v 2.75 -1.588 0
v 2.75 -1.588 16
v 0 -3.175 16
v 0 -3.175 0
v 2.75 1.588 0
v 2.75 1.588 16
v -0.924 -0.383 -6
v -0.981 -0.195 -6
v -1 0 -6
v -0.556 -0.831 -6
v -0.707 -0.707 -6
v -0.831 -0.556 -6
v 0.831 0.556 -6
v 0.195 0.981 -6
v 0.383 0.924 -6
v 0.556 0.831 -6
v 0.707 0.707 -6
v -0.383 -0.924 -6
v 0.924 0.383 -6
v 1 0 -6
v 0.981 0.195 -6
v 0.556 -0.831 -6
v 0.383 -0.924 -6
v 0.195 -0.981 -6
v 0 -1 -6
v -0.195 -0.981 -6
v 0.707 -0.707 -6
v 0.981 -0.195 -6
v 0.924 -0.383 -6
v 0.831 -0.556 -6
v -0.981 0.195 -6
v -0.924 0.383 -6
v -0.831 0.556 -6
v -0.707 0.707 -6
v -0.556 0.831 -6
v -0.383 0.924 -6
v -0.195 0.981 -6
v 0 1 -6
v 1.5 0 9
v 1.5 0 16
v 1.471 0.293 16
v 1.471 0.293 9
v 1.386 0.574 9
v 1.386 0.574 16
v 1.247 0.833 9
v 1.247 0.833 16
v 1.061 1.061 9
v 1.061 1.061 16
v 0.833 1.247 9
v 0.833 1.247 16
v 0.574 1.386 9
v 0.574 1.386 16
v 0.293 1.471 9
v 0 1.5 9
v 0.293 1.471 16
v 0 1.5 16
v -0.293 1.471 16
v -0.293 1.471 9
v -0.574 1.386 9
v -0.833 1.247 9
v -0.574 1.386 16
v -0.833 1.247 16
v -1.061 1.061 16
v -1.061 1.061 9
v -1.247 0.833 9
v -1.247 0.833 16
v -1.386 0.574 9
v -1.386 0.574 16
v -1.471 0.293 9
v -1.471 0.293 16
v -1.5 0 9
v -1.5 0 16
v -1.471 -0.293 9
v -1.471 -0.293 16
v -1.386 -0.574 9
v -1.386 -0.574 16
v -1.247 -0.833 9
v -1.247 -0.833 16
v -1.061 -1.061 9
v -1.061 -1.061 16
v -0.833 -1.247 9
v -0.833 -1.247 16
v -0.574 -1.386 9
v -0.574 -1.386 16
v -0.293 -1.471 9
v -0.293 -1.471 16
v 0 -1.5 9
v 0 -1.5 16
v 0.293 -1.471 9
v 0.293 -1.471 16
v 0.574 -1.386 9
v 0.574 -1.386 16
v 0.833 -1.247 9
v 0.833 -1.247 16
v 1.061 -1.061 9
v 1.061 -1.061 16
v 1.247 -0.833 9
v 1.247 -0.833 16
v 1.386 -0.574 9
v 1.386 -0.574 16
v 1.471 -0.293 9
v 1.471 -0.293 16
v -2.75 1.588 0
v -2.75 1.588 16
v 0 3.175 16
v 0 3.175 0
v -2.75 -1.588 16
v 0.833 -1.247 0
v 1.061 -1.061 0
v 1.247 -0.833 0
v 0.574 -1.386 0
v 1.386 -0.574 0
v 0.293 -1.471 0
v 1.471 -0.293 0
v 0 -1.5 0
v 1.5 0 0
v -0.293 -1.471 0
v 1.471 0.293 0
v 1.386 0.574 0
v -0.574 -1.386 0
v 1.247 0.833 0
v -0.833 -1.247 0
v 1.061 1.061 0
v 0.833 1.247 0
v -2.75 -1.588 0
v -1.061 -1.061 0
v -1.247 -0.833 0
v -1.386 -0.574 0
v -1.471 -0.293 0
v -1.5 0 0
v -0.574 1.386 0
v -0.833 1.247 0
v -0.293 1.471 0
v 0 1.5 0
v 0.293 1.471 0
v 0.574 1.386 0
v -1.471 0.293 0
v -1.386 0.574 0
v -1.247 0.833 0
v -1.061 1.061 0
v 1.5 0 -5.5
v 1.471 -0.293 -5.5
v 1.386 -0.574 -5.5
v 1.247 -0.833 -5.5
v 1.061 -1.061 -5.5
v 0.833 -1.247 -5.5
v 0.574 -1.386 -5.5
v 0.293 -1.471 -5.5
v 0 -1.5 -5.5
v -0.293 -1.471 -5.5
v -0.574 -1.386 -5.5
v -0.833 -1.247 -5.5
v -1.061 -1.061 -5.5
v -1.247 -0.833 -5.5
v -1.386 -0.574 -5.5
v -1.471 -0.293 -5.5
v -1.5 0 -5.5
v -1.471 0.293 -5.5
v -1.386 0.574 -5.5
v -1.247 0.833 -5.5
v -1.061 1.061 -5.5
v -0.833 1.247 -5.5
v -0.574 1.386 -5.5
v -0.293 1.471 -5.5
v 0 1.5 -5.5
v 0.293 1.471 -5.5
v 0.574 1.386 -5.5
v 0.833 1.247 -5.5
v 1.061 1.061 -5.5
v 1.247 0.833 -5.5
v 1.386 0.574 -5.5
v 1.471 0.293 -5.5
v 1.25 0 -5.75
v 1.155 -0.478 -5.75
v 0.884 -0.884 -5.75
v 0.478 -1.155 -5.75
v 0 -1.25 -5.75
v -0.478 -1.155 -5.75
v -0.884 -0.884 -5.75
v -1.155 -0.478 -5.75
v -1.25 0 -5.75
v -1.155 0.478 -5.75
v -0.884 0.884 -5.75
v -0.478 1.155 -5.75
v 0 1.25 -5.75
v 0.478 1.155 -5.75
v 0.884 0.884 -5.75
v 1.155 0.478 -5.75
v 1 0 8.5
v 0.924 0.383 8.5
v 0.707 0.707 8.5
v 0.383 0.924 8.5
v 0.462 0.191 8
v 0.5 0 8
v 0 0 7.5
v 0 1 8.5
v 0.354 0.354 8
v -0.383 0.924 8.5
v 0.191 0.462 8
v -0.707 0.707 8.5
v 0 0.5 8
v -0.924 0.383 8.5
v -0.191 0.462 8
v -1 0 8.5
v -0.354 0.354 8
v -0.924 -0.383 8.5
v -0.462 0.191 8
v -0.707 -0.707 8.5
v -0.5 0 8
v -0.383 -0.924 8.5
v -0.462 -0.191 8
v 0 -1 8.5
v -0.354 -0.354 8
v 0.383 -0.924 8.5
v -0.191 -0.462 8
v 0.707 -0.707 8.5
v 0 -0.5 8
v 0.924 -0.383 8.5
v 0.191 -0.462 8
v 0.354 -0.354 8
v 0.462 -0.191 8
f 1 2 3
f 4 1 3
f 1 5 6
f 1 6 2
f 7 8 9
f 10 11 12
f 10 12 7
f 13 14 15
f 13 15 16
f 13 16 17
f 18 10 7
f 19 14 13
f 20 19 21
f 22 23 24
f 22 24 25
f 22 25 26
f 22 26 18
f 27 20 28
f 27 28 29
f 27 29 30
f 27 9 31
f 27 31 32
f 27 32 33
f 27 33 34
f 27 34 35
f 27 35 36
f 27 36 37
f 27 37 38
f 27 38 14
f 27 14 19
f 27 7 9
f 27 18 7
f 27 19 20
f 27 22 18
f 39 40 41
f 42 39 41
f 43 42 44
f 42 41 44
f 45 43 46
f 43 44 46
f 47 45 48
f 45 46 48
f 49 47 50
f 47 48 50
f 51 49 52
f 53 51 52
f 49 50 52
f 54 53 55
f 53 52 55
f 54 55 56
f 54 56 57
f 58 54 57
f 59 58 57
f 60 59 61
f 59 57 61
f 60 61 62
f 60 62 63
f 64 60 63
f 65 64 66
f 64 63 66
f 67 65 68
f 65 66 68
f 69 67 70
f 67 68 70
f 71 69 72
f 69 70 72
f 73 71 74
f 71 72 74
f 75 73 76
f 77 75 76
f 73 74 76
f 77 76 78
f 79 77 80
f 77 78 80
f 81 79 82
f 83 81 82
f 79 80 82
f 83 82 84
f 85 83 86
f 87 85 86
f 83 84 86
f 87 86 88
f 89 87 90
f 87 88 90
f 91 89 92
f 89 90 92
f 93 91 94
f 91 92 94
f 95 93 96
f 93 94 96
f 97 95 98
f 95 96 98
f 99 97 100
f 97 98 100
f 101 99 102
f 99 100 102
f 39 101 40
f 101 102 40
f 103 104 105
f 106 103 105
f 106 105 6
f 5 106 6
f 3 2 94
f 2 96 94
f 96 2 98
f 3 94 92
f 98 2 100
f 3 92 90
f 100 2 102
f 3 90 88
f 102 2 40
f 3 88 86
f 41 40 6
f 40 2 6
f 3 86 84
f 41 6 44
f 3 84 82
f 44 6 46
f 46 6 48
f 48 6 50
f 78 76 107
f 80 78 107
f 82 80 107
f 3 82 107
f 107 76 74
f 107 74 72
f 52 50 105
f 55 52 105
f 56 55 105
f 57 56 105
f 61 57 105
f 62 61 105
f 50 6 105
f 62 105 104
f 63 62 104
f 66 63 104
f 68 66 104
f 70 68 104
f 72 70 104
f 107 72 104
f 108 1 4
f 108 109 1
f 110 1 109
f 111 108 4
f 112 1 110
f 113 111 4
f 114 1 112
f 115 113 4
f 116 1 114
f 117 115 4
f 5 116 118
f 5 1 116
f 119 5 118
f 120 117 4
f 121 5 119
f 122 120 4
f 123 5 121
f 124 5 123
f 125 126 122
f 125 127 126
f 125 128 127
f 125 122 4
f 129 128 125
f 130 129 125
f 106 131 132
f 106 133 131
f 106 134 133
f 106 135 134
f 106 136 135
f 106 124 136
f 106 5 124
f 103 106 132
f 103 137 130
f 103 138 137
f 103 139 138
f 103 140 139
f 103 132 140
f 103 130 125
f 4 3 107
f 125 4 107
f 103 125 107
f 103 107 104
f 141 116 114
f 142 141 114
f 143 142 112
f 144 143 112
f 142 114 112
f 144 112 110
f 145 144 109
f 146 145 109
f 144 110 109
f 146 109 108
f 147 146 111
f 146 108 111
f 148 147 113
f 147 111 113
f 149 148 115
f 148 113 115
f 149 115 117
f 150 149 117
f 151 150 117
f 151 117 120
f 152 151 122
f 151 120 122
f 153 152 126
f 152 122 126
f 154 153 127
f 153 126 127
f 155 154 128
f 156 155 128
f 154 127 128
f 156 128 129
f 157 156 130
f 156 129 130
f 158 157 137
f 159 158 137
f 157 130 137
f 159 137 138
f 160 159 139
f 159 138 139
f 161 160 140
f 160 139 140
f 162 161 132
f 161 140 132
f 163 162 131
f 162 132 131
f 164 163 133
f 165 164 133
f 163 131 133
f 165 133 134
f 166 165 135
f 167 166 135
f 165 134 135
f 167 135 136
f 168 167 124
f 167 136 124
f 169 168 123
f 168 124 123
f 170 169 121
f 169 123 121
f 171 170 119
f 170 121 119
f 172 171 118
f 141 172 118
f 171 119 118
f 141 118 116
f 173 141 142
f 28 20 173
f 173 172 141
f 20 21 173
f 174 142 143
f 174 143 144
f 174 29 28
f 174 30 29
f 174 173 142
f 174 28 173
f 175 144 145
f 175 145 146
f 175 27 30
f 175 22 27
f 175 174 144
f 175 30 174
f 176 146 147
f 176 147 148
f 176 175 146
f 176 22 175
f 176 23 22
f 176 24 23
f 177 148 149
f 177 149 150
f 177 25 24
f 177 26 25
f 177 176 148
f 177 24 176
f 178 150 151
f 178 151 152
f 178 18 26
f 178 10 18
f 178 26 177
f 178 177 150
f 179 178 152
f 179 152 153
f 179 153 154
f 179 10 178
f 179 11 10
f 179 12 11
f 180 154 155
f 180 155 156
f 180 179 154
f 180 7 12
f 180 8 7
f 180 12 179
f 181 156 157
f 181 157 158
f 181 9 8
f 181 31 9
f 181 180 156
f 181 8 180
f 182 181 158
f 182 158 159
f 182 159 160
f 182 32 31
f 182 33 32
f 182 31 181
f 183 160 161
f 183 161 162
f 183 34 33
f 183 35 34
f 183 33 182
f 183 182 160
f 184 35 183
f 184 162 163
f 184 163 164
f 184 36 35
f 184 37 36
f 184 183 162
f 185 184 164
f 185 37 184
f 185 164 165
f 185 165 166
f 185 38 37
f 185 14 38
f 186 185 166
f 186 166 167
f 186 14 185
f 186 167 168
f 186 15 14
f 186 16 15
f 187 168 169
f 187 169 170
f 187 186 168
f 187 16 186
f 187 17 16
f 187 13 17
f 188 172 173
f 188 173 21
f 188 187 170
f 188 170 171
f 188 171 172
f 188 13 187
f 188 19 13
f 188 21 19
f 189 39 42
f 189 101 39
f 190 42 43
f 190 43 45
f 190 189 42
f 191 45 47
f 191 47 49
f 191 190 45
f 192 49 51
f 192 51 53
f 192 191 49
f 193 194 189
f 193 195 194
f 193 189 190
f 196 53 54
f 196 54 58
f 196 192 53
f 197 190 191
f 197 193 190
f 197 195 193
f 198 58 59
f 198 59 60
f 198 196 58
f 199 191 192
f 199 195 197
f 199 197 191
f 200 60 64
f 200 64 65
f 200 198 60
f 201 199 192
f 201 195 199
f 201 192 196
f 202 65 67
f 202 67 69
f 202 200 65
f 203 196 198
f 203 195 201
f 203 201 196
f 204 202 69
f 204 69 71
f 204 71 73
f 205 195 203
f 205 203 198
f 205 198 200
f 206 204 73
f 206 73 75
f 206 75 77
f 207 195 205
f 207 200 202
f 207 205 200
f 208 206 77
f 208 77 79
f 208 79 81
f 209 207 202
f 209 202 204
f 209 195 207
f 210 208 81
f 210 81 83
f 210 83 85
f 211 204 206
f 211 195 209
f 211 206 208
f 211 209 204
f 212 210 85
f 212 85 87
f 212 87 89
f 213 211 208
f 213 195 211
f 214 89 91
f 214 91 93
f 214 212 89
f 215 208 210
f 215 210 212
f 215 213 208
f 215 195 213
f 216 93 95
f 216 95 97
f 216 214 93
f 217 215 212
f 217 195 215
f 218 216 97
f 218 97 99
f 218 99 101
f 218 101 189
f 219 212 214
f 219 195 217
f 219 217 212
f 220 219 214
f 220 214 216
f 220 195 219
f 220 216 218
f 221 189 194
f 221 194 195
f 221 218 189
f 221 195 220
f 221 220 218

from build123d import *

# Parameters (mm, degrees)
PAD_DEPTH       = 16
SKETCH001_R     = 1.5
PAD001_DEPTH    = 6
SKETCH002_R     = 1.5
POCKET_DEPTH    = 8.5
CHAMFER_SIZE    = 1.5
CHAMFER001_SIZE = 0.5


with BuildPart() as part:
    # Sketch → Pad (new body)
    with BuildSketch(Plane.XY):
        Polygon((-2.75, -1.587713), (-2.75, 1.587713), (0, 3.175426), (2.75, 1.587713), (2.75, -1.587713), (0, -3.175426), align=None)
    extrude(amount=PAD_DEPTH)

    # Sketch001 (on Face7 of Pad) → Pad001 (new body)
    with BuildSketch(Plane(origin=(0, 0, 0), x_dir=(1, 0, 0), z_dir=(0, 0, -1))):
        Circle(SKETCH001_R)
    extrude(amount=PAD001_DEPTH)

    # Sketch002 (on Face5 of Pad001) → Pocket (cut)
    with BuildSketch(Plane.XY.offset(16)):
        Circle(SKETCH002_R)
    extrude(amount=-POCKET_DEPTH, mode=Mode.SUBTRACT)

    # Chamfer
    chamfer_edges = [part.edges().sort_by_distance(p)[0] for p in [
        (-1.5, 0, 7.5),
    ]]
    chamfer(chamfer_edges, length=CHAMFER_SIZE)

    # Chamfer001
    chamfer001_edges = [part.edges().sort_by_distance(p)[0] for p in [
        (-1.5, 0, -6),
    ]]
    chamfer(chamfer001_edges, length=CHAMFER001_SIZE)


solid = part.part
